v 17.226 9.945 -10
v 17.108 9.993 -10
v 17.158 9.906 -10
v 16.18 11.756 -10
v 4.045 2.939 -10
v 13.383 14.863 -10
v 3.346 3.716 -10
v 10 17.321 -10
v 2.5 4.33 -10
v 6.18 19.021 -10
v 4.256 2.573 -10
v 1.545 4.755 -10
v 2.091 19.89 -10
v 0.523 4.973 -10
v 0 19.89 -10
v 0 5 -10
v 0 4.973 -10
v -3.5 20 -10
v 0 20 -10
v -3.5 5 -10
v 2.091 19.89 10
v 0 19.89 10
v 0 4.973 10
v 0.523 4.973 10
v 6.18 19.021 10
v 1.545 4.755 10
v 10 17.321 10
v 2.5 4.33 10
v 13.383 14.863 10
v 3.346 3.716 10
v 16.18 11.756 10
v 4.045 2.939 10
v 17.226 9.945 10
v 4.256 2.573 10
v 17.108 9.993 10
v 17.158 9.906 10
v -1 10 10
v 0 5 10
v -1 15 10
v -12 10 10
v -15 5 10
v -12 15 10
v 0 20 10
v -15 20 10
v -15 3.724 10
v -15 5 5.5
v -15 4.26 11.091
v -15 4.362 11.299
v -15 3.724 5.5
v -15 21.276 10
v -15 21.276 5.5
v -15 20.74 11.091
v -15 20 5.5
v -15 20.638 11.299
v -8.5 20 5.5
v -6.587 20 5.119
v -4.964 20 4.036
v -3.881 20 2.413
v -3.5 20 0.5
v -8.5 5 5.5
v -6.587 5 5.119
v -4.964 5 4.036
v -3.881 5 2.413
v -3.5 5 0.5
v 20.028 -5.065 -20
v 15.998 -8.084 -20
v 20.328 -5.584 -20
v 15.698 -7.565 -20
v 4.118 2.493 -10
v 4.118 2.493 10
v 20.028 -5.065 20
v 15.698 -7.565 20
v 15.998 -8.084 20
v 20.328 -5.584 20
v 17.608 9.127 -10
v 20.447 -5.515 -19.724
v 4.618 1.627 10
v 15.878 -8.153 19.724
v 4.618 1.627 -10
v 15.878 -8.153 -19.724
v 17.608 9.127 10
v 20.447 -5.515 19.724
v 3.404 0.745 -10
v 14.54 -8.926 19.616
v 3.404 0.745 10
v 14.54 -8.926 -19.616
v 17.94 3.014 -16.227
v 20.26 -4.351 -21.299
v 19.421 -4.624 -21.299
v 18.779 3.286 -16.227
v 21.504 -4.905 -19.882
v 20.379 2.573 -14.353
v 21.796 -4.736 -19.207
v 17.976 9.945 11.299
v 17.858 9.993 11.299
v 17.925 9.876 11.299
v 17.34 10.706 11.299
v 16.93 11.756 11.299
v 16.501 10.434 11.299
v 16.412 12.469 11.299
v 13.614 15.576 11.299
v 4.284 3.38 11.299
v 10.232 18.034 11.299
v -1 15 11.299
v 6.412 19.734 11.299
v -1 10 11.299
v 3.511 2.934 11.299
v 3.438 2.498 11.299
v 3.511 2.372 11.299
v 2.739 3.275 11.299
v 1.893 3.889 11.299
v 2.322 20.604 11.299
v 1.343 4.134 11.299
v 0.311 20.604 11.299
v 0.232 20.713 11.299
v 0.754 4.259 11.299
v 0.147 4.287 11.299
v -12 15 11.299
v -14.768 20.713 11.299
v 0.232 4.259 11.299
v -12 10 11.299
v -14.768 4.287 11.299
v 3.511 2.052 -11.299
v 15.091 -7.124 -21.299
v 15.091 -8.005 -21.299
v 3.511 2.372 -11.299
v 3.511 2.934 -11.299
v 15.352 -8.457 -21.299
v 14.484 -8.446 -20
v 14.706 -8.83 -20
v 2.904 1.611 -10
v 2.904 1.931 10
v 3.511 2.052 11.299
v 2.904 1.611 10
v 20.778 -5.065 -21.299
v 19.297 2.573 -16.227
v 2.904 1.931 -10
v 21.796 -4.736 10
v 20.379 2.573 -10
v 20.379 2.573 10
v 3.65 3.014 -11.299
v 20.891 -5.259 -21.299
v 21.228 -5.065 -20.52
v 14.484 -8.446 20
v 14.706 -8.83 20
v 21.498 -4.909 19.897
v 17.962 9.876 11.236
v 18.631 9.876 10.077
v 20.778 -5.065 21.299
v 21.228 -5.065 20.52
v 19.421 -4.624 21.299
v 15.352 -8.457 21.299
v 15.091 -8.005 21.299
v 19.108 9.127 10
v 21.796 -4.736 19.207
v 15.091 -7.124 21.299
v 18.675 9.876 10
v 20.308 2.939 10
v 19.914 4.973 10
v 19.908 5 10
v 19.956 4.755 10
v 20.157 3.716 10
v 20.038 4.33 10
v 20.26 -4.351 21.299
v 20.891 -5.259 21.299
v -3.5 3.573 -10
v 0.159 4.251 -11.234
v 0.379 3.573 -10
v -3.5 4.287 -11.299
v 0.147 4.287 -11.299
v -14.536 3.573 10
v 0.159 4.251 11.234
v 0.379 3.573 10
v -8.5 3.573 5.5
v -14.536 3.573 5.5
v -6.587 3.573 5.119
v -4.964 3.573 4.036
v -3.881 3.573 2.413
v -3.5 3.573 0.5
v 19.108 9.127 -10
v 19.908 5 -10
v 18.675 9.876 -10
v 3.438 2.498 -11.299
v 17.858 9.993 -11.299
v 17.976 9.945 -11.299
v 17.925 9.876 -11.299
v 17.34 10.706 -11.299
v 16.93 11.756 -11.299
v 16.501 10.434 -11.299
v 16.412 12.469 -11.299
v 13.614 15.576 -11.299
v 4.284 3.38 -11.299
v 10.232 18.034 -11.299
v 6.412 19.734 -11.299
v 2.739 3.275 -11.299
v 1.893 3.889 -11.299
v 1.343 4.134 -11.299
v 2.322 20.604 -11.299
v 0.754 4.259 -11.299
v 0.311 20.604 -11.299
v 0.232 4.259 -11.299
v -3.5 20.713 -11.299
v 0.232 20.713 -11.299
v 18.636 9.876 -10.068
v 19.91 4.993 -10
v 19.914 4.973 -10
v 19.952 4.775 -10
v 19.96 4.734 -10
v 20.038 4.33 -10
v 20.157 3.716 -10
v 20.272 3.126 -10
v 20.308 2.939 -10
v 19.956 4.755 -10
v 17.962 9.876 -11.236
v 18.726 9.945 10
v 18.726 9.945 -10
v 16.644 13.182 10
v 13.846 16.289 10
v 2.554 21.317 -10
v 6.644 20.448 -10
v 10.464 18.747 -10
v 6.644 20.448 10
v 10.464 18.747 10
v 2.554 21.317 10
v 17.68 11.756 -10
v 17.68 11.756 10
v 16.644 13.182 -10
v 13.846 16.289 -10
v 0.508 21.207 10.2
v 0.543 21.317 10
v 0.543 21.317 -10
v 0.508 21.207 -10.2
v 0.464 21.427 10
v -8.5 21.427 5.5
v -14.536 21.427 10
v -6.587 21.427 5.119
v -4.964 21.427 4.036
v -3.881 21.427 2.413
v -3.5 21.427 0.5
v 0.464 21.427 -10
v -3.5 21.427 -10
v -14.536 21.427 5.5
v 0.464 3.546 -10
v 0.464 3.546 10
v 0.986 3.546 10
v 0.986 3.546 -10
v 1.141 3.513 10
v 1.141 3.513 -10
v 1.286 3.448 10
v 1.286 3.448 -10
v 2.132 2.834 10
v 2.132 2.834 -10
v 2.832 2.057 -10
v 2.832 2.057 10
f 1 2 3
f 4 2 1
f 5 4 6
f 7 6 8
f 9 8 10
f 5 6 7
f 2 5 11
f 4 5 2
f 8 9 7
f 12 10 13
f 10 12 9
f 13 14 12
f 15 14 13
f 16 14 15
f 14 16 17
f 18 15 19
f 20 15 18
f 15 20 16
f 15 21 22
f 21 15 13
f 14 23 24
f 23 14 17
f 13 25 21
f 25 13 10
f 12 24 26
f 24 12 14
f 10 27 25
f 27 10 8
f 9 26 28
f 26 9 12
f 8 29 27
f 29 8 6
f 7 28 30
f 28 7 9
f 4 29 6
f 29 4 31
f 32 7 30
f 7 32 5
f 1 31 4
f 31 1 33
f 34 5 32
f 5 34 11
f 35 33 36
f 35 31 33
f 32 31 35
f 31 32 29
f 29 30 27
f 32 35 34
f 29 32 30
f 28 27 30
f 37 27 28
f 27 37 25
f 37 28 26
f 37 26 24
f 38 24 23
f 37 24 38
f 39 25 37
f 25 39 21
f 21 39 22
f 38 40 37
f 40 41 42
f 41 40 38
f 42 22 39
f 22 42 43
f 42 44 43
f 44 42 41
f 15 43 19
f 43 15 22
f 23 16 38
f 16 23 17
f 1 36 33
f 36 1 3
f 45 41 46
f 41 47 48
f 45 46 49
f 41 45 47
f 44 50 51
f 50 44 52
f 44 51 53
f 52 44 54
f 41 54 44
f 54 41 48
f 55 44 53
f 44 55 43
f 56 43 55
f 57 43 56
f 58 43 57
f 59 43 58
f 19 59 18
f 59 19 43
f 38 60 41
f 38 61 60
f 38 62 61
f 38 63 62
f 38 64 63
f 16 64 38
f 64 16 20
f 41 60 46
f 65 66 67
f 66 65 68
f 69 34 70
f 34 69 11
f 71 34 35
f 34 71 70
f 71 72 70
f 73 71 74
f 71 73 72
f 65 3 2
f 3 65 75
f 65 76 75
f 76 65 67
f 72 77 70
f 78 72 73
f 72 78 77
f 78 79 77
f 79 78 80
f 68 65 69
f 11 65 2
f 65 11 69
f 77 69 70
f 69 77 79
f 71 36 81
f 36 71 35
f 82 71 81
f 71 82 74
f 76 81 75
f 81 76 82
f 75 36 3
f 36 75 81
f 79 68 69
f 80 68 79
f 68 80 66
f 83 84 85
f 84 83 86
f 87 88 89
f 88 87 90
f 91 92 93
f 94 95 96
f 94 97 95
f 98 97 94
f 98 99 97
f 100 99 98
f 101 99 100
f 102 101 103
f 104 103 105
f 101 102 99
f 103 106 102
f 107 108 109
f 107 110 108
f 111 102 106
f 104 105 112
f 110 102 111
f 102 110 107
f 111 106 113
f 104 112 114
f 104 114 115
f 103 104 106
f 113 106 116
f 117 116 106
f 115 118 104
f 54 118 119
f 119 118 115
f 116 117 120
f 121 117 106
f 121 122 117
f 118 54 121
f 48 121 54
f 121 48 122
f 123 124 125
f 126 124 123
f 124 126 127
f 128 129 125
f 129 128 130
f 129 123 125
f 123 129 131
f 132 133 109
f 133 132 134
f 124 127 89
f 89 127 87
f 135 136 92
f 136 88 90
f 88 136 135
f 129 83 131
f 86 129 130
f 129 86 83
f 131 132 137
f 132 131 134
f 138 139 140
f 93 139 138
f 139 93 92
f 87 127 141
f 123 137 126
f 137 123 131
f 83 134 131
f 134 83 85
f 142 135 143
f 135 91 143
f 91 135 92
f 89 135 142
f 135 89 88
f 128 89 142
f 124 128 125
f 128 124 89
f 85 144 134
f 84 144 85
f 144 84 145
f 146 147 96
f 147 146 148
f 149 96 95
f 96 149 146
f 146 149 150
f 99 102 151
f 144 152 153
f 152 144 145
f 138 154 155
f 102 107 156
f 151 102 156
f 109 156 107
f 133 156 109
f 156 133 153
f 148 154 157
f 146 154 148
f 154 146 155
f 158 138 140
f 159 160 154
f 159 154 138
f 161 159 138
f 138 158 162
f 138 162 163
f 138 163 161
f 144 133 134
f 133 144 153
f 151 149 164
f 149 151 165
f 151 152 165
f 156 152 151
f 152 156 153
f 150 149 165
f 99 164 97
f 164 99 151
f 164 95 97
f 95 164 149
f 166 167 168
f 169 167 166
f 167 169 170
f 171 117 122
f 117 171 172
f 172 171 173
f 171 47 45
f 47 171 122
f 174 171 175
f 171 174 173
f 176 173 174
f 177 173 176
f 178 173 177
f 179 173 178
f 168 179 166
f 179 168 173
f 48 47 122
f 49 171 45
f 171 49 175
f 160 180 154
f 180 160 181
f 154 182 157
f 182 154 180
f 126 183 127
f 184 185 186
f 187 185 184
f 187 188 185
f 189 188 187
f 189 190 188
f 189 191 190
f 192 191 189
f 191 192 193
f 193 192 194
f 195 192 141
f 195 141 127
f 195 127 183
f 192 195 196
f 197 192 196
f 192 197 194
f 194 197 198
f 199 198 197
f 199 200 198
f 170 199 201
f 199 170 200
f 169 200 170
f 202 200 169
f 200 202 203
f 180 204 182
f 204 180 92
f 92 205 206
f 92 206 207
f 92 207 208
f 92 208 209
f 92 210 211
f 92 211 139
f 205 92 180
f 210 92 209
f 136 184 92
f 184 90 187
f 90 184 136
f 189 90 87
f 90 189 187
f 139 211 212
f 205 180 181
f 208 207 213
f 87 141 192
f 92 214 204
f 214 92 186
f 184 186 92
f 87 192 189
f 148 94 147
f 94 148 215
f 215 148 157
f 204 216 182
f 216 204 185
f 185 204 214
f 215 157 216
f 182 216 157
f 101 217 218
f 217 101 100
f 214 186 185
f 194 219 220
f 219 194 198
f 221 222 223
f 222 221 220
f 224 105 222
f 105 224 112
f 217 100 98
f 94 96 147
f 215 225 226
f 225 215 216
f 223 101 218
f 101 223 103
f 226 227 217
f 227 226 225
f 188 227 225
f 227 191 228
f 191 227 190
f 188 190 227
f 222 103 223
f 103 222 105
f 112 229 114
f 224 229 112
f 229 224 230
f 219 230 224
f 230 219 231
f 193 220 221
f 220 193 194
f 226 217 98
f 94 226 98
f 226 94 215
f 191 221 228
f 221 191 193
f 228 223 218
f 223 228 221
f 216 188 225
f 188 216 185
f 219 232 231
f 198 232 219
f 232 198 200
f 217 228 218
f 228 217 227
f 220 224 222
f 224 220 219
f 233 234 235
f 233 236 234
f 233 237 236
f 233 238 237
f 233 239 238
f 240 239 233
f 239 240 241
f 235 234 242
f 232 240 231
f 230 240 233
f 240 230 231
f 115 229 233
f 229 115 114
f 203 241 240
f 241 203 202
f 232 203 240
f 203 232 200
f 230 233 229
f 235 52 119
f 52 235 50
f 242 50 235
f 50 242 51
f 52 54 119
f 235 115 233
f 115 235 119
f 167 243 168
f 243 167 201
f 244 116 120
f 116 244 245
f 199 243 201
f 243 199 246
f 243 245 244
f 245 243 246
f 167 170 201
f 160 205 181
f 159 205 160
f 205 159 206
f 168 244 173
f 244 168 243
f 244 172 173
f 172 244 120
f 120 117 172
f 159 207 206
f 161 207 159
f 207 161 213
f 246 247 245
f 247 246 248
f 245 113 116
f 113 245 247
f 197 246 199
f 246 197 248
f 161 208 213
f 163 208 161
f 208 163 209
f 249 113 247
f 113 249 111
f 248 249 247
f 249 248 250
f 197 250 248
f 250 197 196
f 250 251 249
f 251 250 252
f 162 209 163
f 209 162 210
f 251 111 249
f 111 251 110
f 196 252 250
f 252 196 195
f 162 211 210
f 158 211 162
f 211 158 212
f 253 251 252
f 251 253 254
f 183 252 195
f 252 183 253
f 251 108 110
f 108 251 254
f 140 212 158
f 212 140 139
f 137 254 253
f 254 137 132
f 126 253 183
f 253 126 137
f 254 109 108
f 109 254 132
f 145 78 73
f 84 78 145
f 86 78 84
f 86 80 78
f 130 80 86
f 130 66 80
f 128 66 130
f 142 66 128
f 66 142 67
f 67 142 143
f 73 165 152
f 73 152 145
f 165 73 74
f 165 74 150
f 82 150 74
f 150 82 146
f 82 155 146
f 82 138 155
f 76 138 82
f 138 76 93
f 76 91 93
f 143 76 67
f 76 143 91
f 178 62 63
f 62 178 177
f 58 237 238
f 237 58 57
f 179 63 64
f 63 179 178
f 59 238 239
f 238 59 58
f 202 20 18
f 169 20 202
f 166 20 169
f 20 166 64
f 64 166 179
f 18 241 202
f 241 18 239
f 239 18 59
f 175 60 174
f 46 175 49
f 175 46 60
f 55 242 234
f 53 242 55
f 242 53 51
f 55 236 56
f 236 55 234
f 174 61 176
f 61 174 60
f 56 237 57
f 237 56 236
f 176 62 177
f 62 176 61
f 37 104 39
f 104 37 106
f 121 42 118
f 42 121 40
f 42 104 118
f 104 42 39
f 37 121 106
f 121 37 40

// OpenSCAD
/* [Fan Connection] */
// Extra space on x/y
tolerance = 0;
// x dimension of the fan air out
fan_size_x = 15;
// y dimension of the fan air out
fan_size_y = 20;
// how long to make the fan box connector section
box_length = 15;
/* [Other] */
// the z distance to be used in making the curve of the blower
curve_z = 5;
// outer wall thickness
shell_thickness = 1.5;
// 90 degree points straight at hot end, 0 points straight down
curve_angle = 60;
// x dimension of the blower opening
blower_x = 5;
// y dimension of the blower opening
blower_y = 40;
// how long to make the blower section
blower_l = 15;

size_x = tolerance + fan_size_x;
size_y = tolerance + fan_size_y;

// This makes the bend section
module bend(extra_angle = 0){
    intersection(){
        rotate_extrude(){
            translate([(size_x / 2) + curve_z,0,0] ){
                square([size_x, size_y], center = true);
            }
        }

        // tan(angle) = x_step/50
        // x_step = tan(angle) * 50
        linear_extrude(size_y, center = true){
            polygon(points=[[0, 50],[tan(curve_angle + extra_angle) * 50, 50], [0, 0]]);
        }
    }
}

// This makes the blower (air out)
module blower(){
    hull(){
        translate([0, -0.5, 0]){
            cube([size_x, 1, size_y], center = true);
        }
//        translate([(size_x / 2) - (blower_x / 2),-blower_l,0]){
        translate([0,-blower_l,0]){
            cube([blower_x, 1, blower_y], center = true);
        }
    }
}

// This creates base shape (box for fan, bend and blower) 
module inner_section(){
    translate([-box_length / 2, size_x / 2 + curve_z, 0]){
        cube([box_length, size_x, size_y], center = true);
    }
    bend();
    rotate(a = (90 - curve_angle), v = [0,0,1]){
        translate([((size_x - shell_thickness/4) / 2) + curve_z, 0.1, 0]){
            blower();
        }
    }
}

// This creates a hollow shell with openings at either end
module duct(){
    difference(){
        // create hollow shell
        minkowski(){
            inner_section();
            sphere(shell_thickness);
        }
        inner_section();
        
        // cut openings
        translate([-3 -box_length, 0, 0]){cube([6, 50, 50], center = true);}
        rotate(a = (90 - curve_angle), v = [0,0,1]){
            translate([(size_x / 2) + blower_x * 3,-blower_l - 3,0]){
                cube([blower_x * 6, 6, blower_y * 2], center = true);
            }
        }
    }
}

difference(){
    duct();
    // cut out to fit against fan
    translate([-size_x/2 - 7, curve_z + size_y/2, -shell_thickness-4]){
        rotate(v=[1,0,0], a=90){
            linear_extrude(size_x * 2, center = true){
                minkowski(){
                    square(12, center = true);
                    circle(5);
                }
            }
        }
    }
    // cut out for guide slot
    translate([-box_length/2 + 1, curve_z + size_x/2, size_y/2 + shell_thickness]){
        cube([box_length - 4, 5, 8], center = true);
    }
}
